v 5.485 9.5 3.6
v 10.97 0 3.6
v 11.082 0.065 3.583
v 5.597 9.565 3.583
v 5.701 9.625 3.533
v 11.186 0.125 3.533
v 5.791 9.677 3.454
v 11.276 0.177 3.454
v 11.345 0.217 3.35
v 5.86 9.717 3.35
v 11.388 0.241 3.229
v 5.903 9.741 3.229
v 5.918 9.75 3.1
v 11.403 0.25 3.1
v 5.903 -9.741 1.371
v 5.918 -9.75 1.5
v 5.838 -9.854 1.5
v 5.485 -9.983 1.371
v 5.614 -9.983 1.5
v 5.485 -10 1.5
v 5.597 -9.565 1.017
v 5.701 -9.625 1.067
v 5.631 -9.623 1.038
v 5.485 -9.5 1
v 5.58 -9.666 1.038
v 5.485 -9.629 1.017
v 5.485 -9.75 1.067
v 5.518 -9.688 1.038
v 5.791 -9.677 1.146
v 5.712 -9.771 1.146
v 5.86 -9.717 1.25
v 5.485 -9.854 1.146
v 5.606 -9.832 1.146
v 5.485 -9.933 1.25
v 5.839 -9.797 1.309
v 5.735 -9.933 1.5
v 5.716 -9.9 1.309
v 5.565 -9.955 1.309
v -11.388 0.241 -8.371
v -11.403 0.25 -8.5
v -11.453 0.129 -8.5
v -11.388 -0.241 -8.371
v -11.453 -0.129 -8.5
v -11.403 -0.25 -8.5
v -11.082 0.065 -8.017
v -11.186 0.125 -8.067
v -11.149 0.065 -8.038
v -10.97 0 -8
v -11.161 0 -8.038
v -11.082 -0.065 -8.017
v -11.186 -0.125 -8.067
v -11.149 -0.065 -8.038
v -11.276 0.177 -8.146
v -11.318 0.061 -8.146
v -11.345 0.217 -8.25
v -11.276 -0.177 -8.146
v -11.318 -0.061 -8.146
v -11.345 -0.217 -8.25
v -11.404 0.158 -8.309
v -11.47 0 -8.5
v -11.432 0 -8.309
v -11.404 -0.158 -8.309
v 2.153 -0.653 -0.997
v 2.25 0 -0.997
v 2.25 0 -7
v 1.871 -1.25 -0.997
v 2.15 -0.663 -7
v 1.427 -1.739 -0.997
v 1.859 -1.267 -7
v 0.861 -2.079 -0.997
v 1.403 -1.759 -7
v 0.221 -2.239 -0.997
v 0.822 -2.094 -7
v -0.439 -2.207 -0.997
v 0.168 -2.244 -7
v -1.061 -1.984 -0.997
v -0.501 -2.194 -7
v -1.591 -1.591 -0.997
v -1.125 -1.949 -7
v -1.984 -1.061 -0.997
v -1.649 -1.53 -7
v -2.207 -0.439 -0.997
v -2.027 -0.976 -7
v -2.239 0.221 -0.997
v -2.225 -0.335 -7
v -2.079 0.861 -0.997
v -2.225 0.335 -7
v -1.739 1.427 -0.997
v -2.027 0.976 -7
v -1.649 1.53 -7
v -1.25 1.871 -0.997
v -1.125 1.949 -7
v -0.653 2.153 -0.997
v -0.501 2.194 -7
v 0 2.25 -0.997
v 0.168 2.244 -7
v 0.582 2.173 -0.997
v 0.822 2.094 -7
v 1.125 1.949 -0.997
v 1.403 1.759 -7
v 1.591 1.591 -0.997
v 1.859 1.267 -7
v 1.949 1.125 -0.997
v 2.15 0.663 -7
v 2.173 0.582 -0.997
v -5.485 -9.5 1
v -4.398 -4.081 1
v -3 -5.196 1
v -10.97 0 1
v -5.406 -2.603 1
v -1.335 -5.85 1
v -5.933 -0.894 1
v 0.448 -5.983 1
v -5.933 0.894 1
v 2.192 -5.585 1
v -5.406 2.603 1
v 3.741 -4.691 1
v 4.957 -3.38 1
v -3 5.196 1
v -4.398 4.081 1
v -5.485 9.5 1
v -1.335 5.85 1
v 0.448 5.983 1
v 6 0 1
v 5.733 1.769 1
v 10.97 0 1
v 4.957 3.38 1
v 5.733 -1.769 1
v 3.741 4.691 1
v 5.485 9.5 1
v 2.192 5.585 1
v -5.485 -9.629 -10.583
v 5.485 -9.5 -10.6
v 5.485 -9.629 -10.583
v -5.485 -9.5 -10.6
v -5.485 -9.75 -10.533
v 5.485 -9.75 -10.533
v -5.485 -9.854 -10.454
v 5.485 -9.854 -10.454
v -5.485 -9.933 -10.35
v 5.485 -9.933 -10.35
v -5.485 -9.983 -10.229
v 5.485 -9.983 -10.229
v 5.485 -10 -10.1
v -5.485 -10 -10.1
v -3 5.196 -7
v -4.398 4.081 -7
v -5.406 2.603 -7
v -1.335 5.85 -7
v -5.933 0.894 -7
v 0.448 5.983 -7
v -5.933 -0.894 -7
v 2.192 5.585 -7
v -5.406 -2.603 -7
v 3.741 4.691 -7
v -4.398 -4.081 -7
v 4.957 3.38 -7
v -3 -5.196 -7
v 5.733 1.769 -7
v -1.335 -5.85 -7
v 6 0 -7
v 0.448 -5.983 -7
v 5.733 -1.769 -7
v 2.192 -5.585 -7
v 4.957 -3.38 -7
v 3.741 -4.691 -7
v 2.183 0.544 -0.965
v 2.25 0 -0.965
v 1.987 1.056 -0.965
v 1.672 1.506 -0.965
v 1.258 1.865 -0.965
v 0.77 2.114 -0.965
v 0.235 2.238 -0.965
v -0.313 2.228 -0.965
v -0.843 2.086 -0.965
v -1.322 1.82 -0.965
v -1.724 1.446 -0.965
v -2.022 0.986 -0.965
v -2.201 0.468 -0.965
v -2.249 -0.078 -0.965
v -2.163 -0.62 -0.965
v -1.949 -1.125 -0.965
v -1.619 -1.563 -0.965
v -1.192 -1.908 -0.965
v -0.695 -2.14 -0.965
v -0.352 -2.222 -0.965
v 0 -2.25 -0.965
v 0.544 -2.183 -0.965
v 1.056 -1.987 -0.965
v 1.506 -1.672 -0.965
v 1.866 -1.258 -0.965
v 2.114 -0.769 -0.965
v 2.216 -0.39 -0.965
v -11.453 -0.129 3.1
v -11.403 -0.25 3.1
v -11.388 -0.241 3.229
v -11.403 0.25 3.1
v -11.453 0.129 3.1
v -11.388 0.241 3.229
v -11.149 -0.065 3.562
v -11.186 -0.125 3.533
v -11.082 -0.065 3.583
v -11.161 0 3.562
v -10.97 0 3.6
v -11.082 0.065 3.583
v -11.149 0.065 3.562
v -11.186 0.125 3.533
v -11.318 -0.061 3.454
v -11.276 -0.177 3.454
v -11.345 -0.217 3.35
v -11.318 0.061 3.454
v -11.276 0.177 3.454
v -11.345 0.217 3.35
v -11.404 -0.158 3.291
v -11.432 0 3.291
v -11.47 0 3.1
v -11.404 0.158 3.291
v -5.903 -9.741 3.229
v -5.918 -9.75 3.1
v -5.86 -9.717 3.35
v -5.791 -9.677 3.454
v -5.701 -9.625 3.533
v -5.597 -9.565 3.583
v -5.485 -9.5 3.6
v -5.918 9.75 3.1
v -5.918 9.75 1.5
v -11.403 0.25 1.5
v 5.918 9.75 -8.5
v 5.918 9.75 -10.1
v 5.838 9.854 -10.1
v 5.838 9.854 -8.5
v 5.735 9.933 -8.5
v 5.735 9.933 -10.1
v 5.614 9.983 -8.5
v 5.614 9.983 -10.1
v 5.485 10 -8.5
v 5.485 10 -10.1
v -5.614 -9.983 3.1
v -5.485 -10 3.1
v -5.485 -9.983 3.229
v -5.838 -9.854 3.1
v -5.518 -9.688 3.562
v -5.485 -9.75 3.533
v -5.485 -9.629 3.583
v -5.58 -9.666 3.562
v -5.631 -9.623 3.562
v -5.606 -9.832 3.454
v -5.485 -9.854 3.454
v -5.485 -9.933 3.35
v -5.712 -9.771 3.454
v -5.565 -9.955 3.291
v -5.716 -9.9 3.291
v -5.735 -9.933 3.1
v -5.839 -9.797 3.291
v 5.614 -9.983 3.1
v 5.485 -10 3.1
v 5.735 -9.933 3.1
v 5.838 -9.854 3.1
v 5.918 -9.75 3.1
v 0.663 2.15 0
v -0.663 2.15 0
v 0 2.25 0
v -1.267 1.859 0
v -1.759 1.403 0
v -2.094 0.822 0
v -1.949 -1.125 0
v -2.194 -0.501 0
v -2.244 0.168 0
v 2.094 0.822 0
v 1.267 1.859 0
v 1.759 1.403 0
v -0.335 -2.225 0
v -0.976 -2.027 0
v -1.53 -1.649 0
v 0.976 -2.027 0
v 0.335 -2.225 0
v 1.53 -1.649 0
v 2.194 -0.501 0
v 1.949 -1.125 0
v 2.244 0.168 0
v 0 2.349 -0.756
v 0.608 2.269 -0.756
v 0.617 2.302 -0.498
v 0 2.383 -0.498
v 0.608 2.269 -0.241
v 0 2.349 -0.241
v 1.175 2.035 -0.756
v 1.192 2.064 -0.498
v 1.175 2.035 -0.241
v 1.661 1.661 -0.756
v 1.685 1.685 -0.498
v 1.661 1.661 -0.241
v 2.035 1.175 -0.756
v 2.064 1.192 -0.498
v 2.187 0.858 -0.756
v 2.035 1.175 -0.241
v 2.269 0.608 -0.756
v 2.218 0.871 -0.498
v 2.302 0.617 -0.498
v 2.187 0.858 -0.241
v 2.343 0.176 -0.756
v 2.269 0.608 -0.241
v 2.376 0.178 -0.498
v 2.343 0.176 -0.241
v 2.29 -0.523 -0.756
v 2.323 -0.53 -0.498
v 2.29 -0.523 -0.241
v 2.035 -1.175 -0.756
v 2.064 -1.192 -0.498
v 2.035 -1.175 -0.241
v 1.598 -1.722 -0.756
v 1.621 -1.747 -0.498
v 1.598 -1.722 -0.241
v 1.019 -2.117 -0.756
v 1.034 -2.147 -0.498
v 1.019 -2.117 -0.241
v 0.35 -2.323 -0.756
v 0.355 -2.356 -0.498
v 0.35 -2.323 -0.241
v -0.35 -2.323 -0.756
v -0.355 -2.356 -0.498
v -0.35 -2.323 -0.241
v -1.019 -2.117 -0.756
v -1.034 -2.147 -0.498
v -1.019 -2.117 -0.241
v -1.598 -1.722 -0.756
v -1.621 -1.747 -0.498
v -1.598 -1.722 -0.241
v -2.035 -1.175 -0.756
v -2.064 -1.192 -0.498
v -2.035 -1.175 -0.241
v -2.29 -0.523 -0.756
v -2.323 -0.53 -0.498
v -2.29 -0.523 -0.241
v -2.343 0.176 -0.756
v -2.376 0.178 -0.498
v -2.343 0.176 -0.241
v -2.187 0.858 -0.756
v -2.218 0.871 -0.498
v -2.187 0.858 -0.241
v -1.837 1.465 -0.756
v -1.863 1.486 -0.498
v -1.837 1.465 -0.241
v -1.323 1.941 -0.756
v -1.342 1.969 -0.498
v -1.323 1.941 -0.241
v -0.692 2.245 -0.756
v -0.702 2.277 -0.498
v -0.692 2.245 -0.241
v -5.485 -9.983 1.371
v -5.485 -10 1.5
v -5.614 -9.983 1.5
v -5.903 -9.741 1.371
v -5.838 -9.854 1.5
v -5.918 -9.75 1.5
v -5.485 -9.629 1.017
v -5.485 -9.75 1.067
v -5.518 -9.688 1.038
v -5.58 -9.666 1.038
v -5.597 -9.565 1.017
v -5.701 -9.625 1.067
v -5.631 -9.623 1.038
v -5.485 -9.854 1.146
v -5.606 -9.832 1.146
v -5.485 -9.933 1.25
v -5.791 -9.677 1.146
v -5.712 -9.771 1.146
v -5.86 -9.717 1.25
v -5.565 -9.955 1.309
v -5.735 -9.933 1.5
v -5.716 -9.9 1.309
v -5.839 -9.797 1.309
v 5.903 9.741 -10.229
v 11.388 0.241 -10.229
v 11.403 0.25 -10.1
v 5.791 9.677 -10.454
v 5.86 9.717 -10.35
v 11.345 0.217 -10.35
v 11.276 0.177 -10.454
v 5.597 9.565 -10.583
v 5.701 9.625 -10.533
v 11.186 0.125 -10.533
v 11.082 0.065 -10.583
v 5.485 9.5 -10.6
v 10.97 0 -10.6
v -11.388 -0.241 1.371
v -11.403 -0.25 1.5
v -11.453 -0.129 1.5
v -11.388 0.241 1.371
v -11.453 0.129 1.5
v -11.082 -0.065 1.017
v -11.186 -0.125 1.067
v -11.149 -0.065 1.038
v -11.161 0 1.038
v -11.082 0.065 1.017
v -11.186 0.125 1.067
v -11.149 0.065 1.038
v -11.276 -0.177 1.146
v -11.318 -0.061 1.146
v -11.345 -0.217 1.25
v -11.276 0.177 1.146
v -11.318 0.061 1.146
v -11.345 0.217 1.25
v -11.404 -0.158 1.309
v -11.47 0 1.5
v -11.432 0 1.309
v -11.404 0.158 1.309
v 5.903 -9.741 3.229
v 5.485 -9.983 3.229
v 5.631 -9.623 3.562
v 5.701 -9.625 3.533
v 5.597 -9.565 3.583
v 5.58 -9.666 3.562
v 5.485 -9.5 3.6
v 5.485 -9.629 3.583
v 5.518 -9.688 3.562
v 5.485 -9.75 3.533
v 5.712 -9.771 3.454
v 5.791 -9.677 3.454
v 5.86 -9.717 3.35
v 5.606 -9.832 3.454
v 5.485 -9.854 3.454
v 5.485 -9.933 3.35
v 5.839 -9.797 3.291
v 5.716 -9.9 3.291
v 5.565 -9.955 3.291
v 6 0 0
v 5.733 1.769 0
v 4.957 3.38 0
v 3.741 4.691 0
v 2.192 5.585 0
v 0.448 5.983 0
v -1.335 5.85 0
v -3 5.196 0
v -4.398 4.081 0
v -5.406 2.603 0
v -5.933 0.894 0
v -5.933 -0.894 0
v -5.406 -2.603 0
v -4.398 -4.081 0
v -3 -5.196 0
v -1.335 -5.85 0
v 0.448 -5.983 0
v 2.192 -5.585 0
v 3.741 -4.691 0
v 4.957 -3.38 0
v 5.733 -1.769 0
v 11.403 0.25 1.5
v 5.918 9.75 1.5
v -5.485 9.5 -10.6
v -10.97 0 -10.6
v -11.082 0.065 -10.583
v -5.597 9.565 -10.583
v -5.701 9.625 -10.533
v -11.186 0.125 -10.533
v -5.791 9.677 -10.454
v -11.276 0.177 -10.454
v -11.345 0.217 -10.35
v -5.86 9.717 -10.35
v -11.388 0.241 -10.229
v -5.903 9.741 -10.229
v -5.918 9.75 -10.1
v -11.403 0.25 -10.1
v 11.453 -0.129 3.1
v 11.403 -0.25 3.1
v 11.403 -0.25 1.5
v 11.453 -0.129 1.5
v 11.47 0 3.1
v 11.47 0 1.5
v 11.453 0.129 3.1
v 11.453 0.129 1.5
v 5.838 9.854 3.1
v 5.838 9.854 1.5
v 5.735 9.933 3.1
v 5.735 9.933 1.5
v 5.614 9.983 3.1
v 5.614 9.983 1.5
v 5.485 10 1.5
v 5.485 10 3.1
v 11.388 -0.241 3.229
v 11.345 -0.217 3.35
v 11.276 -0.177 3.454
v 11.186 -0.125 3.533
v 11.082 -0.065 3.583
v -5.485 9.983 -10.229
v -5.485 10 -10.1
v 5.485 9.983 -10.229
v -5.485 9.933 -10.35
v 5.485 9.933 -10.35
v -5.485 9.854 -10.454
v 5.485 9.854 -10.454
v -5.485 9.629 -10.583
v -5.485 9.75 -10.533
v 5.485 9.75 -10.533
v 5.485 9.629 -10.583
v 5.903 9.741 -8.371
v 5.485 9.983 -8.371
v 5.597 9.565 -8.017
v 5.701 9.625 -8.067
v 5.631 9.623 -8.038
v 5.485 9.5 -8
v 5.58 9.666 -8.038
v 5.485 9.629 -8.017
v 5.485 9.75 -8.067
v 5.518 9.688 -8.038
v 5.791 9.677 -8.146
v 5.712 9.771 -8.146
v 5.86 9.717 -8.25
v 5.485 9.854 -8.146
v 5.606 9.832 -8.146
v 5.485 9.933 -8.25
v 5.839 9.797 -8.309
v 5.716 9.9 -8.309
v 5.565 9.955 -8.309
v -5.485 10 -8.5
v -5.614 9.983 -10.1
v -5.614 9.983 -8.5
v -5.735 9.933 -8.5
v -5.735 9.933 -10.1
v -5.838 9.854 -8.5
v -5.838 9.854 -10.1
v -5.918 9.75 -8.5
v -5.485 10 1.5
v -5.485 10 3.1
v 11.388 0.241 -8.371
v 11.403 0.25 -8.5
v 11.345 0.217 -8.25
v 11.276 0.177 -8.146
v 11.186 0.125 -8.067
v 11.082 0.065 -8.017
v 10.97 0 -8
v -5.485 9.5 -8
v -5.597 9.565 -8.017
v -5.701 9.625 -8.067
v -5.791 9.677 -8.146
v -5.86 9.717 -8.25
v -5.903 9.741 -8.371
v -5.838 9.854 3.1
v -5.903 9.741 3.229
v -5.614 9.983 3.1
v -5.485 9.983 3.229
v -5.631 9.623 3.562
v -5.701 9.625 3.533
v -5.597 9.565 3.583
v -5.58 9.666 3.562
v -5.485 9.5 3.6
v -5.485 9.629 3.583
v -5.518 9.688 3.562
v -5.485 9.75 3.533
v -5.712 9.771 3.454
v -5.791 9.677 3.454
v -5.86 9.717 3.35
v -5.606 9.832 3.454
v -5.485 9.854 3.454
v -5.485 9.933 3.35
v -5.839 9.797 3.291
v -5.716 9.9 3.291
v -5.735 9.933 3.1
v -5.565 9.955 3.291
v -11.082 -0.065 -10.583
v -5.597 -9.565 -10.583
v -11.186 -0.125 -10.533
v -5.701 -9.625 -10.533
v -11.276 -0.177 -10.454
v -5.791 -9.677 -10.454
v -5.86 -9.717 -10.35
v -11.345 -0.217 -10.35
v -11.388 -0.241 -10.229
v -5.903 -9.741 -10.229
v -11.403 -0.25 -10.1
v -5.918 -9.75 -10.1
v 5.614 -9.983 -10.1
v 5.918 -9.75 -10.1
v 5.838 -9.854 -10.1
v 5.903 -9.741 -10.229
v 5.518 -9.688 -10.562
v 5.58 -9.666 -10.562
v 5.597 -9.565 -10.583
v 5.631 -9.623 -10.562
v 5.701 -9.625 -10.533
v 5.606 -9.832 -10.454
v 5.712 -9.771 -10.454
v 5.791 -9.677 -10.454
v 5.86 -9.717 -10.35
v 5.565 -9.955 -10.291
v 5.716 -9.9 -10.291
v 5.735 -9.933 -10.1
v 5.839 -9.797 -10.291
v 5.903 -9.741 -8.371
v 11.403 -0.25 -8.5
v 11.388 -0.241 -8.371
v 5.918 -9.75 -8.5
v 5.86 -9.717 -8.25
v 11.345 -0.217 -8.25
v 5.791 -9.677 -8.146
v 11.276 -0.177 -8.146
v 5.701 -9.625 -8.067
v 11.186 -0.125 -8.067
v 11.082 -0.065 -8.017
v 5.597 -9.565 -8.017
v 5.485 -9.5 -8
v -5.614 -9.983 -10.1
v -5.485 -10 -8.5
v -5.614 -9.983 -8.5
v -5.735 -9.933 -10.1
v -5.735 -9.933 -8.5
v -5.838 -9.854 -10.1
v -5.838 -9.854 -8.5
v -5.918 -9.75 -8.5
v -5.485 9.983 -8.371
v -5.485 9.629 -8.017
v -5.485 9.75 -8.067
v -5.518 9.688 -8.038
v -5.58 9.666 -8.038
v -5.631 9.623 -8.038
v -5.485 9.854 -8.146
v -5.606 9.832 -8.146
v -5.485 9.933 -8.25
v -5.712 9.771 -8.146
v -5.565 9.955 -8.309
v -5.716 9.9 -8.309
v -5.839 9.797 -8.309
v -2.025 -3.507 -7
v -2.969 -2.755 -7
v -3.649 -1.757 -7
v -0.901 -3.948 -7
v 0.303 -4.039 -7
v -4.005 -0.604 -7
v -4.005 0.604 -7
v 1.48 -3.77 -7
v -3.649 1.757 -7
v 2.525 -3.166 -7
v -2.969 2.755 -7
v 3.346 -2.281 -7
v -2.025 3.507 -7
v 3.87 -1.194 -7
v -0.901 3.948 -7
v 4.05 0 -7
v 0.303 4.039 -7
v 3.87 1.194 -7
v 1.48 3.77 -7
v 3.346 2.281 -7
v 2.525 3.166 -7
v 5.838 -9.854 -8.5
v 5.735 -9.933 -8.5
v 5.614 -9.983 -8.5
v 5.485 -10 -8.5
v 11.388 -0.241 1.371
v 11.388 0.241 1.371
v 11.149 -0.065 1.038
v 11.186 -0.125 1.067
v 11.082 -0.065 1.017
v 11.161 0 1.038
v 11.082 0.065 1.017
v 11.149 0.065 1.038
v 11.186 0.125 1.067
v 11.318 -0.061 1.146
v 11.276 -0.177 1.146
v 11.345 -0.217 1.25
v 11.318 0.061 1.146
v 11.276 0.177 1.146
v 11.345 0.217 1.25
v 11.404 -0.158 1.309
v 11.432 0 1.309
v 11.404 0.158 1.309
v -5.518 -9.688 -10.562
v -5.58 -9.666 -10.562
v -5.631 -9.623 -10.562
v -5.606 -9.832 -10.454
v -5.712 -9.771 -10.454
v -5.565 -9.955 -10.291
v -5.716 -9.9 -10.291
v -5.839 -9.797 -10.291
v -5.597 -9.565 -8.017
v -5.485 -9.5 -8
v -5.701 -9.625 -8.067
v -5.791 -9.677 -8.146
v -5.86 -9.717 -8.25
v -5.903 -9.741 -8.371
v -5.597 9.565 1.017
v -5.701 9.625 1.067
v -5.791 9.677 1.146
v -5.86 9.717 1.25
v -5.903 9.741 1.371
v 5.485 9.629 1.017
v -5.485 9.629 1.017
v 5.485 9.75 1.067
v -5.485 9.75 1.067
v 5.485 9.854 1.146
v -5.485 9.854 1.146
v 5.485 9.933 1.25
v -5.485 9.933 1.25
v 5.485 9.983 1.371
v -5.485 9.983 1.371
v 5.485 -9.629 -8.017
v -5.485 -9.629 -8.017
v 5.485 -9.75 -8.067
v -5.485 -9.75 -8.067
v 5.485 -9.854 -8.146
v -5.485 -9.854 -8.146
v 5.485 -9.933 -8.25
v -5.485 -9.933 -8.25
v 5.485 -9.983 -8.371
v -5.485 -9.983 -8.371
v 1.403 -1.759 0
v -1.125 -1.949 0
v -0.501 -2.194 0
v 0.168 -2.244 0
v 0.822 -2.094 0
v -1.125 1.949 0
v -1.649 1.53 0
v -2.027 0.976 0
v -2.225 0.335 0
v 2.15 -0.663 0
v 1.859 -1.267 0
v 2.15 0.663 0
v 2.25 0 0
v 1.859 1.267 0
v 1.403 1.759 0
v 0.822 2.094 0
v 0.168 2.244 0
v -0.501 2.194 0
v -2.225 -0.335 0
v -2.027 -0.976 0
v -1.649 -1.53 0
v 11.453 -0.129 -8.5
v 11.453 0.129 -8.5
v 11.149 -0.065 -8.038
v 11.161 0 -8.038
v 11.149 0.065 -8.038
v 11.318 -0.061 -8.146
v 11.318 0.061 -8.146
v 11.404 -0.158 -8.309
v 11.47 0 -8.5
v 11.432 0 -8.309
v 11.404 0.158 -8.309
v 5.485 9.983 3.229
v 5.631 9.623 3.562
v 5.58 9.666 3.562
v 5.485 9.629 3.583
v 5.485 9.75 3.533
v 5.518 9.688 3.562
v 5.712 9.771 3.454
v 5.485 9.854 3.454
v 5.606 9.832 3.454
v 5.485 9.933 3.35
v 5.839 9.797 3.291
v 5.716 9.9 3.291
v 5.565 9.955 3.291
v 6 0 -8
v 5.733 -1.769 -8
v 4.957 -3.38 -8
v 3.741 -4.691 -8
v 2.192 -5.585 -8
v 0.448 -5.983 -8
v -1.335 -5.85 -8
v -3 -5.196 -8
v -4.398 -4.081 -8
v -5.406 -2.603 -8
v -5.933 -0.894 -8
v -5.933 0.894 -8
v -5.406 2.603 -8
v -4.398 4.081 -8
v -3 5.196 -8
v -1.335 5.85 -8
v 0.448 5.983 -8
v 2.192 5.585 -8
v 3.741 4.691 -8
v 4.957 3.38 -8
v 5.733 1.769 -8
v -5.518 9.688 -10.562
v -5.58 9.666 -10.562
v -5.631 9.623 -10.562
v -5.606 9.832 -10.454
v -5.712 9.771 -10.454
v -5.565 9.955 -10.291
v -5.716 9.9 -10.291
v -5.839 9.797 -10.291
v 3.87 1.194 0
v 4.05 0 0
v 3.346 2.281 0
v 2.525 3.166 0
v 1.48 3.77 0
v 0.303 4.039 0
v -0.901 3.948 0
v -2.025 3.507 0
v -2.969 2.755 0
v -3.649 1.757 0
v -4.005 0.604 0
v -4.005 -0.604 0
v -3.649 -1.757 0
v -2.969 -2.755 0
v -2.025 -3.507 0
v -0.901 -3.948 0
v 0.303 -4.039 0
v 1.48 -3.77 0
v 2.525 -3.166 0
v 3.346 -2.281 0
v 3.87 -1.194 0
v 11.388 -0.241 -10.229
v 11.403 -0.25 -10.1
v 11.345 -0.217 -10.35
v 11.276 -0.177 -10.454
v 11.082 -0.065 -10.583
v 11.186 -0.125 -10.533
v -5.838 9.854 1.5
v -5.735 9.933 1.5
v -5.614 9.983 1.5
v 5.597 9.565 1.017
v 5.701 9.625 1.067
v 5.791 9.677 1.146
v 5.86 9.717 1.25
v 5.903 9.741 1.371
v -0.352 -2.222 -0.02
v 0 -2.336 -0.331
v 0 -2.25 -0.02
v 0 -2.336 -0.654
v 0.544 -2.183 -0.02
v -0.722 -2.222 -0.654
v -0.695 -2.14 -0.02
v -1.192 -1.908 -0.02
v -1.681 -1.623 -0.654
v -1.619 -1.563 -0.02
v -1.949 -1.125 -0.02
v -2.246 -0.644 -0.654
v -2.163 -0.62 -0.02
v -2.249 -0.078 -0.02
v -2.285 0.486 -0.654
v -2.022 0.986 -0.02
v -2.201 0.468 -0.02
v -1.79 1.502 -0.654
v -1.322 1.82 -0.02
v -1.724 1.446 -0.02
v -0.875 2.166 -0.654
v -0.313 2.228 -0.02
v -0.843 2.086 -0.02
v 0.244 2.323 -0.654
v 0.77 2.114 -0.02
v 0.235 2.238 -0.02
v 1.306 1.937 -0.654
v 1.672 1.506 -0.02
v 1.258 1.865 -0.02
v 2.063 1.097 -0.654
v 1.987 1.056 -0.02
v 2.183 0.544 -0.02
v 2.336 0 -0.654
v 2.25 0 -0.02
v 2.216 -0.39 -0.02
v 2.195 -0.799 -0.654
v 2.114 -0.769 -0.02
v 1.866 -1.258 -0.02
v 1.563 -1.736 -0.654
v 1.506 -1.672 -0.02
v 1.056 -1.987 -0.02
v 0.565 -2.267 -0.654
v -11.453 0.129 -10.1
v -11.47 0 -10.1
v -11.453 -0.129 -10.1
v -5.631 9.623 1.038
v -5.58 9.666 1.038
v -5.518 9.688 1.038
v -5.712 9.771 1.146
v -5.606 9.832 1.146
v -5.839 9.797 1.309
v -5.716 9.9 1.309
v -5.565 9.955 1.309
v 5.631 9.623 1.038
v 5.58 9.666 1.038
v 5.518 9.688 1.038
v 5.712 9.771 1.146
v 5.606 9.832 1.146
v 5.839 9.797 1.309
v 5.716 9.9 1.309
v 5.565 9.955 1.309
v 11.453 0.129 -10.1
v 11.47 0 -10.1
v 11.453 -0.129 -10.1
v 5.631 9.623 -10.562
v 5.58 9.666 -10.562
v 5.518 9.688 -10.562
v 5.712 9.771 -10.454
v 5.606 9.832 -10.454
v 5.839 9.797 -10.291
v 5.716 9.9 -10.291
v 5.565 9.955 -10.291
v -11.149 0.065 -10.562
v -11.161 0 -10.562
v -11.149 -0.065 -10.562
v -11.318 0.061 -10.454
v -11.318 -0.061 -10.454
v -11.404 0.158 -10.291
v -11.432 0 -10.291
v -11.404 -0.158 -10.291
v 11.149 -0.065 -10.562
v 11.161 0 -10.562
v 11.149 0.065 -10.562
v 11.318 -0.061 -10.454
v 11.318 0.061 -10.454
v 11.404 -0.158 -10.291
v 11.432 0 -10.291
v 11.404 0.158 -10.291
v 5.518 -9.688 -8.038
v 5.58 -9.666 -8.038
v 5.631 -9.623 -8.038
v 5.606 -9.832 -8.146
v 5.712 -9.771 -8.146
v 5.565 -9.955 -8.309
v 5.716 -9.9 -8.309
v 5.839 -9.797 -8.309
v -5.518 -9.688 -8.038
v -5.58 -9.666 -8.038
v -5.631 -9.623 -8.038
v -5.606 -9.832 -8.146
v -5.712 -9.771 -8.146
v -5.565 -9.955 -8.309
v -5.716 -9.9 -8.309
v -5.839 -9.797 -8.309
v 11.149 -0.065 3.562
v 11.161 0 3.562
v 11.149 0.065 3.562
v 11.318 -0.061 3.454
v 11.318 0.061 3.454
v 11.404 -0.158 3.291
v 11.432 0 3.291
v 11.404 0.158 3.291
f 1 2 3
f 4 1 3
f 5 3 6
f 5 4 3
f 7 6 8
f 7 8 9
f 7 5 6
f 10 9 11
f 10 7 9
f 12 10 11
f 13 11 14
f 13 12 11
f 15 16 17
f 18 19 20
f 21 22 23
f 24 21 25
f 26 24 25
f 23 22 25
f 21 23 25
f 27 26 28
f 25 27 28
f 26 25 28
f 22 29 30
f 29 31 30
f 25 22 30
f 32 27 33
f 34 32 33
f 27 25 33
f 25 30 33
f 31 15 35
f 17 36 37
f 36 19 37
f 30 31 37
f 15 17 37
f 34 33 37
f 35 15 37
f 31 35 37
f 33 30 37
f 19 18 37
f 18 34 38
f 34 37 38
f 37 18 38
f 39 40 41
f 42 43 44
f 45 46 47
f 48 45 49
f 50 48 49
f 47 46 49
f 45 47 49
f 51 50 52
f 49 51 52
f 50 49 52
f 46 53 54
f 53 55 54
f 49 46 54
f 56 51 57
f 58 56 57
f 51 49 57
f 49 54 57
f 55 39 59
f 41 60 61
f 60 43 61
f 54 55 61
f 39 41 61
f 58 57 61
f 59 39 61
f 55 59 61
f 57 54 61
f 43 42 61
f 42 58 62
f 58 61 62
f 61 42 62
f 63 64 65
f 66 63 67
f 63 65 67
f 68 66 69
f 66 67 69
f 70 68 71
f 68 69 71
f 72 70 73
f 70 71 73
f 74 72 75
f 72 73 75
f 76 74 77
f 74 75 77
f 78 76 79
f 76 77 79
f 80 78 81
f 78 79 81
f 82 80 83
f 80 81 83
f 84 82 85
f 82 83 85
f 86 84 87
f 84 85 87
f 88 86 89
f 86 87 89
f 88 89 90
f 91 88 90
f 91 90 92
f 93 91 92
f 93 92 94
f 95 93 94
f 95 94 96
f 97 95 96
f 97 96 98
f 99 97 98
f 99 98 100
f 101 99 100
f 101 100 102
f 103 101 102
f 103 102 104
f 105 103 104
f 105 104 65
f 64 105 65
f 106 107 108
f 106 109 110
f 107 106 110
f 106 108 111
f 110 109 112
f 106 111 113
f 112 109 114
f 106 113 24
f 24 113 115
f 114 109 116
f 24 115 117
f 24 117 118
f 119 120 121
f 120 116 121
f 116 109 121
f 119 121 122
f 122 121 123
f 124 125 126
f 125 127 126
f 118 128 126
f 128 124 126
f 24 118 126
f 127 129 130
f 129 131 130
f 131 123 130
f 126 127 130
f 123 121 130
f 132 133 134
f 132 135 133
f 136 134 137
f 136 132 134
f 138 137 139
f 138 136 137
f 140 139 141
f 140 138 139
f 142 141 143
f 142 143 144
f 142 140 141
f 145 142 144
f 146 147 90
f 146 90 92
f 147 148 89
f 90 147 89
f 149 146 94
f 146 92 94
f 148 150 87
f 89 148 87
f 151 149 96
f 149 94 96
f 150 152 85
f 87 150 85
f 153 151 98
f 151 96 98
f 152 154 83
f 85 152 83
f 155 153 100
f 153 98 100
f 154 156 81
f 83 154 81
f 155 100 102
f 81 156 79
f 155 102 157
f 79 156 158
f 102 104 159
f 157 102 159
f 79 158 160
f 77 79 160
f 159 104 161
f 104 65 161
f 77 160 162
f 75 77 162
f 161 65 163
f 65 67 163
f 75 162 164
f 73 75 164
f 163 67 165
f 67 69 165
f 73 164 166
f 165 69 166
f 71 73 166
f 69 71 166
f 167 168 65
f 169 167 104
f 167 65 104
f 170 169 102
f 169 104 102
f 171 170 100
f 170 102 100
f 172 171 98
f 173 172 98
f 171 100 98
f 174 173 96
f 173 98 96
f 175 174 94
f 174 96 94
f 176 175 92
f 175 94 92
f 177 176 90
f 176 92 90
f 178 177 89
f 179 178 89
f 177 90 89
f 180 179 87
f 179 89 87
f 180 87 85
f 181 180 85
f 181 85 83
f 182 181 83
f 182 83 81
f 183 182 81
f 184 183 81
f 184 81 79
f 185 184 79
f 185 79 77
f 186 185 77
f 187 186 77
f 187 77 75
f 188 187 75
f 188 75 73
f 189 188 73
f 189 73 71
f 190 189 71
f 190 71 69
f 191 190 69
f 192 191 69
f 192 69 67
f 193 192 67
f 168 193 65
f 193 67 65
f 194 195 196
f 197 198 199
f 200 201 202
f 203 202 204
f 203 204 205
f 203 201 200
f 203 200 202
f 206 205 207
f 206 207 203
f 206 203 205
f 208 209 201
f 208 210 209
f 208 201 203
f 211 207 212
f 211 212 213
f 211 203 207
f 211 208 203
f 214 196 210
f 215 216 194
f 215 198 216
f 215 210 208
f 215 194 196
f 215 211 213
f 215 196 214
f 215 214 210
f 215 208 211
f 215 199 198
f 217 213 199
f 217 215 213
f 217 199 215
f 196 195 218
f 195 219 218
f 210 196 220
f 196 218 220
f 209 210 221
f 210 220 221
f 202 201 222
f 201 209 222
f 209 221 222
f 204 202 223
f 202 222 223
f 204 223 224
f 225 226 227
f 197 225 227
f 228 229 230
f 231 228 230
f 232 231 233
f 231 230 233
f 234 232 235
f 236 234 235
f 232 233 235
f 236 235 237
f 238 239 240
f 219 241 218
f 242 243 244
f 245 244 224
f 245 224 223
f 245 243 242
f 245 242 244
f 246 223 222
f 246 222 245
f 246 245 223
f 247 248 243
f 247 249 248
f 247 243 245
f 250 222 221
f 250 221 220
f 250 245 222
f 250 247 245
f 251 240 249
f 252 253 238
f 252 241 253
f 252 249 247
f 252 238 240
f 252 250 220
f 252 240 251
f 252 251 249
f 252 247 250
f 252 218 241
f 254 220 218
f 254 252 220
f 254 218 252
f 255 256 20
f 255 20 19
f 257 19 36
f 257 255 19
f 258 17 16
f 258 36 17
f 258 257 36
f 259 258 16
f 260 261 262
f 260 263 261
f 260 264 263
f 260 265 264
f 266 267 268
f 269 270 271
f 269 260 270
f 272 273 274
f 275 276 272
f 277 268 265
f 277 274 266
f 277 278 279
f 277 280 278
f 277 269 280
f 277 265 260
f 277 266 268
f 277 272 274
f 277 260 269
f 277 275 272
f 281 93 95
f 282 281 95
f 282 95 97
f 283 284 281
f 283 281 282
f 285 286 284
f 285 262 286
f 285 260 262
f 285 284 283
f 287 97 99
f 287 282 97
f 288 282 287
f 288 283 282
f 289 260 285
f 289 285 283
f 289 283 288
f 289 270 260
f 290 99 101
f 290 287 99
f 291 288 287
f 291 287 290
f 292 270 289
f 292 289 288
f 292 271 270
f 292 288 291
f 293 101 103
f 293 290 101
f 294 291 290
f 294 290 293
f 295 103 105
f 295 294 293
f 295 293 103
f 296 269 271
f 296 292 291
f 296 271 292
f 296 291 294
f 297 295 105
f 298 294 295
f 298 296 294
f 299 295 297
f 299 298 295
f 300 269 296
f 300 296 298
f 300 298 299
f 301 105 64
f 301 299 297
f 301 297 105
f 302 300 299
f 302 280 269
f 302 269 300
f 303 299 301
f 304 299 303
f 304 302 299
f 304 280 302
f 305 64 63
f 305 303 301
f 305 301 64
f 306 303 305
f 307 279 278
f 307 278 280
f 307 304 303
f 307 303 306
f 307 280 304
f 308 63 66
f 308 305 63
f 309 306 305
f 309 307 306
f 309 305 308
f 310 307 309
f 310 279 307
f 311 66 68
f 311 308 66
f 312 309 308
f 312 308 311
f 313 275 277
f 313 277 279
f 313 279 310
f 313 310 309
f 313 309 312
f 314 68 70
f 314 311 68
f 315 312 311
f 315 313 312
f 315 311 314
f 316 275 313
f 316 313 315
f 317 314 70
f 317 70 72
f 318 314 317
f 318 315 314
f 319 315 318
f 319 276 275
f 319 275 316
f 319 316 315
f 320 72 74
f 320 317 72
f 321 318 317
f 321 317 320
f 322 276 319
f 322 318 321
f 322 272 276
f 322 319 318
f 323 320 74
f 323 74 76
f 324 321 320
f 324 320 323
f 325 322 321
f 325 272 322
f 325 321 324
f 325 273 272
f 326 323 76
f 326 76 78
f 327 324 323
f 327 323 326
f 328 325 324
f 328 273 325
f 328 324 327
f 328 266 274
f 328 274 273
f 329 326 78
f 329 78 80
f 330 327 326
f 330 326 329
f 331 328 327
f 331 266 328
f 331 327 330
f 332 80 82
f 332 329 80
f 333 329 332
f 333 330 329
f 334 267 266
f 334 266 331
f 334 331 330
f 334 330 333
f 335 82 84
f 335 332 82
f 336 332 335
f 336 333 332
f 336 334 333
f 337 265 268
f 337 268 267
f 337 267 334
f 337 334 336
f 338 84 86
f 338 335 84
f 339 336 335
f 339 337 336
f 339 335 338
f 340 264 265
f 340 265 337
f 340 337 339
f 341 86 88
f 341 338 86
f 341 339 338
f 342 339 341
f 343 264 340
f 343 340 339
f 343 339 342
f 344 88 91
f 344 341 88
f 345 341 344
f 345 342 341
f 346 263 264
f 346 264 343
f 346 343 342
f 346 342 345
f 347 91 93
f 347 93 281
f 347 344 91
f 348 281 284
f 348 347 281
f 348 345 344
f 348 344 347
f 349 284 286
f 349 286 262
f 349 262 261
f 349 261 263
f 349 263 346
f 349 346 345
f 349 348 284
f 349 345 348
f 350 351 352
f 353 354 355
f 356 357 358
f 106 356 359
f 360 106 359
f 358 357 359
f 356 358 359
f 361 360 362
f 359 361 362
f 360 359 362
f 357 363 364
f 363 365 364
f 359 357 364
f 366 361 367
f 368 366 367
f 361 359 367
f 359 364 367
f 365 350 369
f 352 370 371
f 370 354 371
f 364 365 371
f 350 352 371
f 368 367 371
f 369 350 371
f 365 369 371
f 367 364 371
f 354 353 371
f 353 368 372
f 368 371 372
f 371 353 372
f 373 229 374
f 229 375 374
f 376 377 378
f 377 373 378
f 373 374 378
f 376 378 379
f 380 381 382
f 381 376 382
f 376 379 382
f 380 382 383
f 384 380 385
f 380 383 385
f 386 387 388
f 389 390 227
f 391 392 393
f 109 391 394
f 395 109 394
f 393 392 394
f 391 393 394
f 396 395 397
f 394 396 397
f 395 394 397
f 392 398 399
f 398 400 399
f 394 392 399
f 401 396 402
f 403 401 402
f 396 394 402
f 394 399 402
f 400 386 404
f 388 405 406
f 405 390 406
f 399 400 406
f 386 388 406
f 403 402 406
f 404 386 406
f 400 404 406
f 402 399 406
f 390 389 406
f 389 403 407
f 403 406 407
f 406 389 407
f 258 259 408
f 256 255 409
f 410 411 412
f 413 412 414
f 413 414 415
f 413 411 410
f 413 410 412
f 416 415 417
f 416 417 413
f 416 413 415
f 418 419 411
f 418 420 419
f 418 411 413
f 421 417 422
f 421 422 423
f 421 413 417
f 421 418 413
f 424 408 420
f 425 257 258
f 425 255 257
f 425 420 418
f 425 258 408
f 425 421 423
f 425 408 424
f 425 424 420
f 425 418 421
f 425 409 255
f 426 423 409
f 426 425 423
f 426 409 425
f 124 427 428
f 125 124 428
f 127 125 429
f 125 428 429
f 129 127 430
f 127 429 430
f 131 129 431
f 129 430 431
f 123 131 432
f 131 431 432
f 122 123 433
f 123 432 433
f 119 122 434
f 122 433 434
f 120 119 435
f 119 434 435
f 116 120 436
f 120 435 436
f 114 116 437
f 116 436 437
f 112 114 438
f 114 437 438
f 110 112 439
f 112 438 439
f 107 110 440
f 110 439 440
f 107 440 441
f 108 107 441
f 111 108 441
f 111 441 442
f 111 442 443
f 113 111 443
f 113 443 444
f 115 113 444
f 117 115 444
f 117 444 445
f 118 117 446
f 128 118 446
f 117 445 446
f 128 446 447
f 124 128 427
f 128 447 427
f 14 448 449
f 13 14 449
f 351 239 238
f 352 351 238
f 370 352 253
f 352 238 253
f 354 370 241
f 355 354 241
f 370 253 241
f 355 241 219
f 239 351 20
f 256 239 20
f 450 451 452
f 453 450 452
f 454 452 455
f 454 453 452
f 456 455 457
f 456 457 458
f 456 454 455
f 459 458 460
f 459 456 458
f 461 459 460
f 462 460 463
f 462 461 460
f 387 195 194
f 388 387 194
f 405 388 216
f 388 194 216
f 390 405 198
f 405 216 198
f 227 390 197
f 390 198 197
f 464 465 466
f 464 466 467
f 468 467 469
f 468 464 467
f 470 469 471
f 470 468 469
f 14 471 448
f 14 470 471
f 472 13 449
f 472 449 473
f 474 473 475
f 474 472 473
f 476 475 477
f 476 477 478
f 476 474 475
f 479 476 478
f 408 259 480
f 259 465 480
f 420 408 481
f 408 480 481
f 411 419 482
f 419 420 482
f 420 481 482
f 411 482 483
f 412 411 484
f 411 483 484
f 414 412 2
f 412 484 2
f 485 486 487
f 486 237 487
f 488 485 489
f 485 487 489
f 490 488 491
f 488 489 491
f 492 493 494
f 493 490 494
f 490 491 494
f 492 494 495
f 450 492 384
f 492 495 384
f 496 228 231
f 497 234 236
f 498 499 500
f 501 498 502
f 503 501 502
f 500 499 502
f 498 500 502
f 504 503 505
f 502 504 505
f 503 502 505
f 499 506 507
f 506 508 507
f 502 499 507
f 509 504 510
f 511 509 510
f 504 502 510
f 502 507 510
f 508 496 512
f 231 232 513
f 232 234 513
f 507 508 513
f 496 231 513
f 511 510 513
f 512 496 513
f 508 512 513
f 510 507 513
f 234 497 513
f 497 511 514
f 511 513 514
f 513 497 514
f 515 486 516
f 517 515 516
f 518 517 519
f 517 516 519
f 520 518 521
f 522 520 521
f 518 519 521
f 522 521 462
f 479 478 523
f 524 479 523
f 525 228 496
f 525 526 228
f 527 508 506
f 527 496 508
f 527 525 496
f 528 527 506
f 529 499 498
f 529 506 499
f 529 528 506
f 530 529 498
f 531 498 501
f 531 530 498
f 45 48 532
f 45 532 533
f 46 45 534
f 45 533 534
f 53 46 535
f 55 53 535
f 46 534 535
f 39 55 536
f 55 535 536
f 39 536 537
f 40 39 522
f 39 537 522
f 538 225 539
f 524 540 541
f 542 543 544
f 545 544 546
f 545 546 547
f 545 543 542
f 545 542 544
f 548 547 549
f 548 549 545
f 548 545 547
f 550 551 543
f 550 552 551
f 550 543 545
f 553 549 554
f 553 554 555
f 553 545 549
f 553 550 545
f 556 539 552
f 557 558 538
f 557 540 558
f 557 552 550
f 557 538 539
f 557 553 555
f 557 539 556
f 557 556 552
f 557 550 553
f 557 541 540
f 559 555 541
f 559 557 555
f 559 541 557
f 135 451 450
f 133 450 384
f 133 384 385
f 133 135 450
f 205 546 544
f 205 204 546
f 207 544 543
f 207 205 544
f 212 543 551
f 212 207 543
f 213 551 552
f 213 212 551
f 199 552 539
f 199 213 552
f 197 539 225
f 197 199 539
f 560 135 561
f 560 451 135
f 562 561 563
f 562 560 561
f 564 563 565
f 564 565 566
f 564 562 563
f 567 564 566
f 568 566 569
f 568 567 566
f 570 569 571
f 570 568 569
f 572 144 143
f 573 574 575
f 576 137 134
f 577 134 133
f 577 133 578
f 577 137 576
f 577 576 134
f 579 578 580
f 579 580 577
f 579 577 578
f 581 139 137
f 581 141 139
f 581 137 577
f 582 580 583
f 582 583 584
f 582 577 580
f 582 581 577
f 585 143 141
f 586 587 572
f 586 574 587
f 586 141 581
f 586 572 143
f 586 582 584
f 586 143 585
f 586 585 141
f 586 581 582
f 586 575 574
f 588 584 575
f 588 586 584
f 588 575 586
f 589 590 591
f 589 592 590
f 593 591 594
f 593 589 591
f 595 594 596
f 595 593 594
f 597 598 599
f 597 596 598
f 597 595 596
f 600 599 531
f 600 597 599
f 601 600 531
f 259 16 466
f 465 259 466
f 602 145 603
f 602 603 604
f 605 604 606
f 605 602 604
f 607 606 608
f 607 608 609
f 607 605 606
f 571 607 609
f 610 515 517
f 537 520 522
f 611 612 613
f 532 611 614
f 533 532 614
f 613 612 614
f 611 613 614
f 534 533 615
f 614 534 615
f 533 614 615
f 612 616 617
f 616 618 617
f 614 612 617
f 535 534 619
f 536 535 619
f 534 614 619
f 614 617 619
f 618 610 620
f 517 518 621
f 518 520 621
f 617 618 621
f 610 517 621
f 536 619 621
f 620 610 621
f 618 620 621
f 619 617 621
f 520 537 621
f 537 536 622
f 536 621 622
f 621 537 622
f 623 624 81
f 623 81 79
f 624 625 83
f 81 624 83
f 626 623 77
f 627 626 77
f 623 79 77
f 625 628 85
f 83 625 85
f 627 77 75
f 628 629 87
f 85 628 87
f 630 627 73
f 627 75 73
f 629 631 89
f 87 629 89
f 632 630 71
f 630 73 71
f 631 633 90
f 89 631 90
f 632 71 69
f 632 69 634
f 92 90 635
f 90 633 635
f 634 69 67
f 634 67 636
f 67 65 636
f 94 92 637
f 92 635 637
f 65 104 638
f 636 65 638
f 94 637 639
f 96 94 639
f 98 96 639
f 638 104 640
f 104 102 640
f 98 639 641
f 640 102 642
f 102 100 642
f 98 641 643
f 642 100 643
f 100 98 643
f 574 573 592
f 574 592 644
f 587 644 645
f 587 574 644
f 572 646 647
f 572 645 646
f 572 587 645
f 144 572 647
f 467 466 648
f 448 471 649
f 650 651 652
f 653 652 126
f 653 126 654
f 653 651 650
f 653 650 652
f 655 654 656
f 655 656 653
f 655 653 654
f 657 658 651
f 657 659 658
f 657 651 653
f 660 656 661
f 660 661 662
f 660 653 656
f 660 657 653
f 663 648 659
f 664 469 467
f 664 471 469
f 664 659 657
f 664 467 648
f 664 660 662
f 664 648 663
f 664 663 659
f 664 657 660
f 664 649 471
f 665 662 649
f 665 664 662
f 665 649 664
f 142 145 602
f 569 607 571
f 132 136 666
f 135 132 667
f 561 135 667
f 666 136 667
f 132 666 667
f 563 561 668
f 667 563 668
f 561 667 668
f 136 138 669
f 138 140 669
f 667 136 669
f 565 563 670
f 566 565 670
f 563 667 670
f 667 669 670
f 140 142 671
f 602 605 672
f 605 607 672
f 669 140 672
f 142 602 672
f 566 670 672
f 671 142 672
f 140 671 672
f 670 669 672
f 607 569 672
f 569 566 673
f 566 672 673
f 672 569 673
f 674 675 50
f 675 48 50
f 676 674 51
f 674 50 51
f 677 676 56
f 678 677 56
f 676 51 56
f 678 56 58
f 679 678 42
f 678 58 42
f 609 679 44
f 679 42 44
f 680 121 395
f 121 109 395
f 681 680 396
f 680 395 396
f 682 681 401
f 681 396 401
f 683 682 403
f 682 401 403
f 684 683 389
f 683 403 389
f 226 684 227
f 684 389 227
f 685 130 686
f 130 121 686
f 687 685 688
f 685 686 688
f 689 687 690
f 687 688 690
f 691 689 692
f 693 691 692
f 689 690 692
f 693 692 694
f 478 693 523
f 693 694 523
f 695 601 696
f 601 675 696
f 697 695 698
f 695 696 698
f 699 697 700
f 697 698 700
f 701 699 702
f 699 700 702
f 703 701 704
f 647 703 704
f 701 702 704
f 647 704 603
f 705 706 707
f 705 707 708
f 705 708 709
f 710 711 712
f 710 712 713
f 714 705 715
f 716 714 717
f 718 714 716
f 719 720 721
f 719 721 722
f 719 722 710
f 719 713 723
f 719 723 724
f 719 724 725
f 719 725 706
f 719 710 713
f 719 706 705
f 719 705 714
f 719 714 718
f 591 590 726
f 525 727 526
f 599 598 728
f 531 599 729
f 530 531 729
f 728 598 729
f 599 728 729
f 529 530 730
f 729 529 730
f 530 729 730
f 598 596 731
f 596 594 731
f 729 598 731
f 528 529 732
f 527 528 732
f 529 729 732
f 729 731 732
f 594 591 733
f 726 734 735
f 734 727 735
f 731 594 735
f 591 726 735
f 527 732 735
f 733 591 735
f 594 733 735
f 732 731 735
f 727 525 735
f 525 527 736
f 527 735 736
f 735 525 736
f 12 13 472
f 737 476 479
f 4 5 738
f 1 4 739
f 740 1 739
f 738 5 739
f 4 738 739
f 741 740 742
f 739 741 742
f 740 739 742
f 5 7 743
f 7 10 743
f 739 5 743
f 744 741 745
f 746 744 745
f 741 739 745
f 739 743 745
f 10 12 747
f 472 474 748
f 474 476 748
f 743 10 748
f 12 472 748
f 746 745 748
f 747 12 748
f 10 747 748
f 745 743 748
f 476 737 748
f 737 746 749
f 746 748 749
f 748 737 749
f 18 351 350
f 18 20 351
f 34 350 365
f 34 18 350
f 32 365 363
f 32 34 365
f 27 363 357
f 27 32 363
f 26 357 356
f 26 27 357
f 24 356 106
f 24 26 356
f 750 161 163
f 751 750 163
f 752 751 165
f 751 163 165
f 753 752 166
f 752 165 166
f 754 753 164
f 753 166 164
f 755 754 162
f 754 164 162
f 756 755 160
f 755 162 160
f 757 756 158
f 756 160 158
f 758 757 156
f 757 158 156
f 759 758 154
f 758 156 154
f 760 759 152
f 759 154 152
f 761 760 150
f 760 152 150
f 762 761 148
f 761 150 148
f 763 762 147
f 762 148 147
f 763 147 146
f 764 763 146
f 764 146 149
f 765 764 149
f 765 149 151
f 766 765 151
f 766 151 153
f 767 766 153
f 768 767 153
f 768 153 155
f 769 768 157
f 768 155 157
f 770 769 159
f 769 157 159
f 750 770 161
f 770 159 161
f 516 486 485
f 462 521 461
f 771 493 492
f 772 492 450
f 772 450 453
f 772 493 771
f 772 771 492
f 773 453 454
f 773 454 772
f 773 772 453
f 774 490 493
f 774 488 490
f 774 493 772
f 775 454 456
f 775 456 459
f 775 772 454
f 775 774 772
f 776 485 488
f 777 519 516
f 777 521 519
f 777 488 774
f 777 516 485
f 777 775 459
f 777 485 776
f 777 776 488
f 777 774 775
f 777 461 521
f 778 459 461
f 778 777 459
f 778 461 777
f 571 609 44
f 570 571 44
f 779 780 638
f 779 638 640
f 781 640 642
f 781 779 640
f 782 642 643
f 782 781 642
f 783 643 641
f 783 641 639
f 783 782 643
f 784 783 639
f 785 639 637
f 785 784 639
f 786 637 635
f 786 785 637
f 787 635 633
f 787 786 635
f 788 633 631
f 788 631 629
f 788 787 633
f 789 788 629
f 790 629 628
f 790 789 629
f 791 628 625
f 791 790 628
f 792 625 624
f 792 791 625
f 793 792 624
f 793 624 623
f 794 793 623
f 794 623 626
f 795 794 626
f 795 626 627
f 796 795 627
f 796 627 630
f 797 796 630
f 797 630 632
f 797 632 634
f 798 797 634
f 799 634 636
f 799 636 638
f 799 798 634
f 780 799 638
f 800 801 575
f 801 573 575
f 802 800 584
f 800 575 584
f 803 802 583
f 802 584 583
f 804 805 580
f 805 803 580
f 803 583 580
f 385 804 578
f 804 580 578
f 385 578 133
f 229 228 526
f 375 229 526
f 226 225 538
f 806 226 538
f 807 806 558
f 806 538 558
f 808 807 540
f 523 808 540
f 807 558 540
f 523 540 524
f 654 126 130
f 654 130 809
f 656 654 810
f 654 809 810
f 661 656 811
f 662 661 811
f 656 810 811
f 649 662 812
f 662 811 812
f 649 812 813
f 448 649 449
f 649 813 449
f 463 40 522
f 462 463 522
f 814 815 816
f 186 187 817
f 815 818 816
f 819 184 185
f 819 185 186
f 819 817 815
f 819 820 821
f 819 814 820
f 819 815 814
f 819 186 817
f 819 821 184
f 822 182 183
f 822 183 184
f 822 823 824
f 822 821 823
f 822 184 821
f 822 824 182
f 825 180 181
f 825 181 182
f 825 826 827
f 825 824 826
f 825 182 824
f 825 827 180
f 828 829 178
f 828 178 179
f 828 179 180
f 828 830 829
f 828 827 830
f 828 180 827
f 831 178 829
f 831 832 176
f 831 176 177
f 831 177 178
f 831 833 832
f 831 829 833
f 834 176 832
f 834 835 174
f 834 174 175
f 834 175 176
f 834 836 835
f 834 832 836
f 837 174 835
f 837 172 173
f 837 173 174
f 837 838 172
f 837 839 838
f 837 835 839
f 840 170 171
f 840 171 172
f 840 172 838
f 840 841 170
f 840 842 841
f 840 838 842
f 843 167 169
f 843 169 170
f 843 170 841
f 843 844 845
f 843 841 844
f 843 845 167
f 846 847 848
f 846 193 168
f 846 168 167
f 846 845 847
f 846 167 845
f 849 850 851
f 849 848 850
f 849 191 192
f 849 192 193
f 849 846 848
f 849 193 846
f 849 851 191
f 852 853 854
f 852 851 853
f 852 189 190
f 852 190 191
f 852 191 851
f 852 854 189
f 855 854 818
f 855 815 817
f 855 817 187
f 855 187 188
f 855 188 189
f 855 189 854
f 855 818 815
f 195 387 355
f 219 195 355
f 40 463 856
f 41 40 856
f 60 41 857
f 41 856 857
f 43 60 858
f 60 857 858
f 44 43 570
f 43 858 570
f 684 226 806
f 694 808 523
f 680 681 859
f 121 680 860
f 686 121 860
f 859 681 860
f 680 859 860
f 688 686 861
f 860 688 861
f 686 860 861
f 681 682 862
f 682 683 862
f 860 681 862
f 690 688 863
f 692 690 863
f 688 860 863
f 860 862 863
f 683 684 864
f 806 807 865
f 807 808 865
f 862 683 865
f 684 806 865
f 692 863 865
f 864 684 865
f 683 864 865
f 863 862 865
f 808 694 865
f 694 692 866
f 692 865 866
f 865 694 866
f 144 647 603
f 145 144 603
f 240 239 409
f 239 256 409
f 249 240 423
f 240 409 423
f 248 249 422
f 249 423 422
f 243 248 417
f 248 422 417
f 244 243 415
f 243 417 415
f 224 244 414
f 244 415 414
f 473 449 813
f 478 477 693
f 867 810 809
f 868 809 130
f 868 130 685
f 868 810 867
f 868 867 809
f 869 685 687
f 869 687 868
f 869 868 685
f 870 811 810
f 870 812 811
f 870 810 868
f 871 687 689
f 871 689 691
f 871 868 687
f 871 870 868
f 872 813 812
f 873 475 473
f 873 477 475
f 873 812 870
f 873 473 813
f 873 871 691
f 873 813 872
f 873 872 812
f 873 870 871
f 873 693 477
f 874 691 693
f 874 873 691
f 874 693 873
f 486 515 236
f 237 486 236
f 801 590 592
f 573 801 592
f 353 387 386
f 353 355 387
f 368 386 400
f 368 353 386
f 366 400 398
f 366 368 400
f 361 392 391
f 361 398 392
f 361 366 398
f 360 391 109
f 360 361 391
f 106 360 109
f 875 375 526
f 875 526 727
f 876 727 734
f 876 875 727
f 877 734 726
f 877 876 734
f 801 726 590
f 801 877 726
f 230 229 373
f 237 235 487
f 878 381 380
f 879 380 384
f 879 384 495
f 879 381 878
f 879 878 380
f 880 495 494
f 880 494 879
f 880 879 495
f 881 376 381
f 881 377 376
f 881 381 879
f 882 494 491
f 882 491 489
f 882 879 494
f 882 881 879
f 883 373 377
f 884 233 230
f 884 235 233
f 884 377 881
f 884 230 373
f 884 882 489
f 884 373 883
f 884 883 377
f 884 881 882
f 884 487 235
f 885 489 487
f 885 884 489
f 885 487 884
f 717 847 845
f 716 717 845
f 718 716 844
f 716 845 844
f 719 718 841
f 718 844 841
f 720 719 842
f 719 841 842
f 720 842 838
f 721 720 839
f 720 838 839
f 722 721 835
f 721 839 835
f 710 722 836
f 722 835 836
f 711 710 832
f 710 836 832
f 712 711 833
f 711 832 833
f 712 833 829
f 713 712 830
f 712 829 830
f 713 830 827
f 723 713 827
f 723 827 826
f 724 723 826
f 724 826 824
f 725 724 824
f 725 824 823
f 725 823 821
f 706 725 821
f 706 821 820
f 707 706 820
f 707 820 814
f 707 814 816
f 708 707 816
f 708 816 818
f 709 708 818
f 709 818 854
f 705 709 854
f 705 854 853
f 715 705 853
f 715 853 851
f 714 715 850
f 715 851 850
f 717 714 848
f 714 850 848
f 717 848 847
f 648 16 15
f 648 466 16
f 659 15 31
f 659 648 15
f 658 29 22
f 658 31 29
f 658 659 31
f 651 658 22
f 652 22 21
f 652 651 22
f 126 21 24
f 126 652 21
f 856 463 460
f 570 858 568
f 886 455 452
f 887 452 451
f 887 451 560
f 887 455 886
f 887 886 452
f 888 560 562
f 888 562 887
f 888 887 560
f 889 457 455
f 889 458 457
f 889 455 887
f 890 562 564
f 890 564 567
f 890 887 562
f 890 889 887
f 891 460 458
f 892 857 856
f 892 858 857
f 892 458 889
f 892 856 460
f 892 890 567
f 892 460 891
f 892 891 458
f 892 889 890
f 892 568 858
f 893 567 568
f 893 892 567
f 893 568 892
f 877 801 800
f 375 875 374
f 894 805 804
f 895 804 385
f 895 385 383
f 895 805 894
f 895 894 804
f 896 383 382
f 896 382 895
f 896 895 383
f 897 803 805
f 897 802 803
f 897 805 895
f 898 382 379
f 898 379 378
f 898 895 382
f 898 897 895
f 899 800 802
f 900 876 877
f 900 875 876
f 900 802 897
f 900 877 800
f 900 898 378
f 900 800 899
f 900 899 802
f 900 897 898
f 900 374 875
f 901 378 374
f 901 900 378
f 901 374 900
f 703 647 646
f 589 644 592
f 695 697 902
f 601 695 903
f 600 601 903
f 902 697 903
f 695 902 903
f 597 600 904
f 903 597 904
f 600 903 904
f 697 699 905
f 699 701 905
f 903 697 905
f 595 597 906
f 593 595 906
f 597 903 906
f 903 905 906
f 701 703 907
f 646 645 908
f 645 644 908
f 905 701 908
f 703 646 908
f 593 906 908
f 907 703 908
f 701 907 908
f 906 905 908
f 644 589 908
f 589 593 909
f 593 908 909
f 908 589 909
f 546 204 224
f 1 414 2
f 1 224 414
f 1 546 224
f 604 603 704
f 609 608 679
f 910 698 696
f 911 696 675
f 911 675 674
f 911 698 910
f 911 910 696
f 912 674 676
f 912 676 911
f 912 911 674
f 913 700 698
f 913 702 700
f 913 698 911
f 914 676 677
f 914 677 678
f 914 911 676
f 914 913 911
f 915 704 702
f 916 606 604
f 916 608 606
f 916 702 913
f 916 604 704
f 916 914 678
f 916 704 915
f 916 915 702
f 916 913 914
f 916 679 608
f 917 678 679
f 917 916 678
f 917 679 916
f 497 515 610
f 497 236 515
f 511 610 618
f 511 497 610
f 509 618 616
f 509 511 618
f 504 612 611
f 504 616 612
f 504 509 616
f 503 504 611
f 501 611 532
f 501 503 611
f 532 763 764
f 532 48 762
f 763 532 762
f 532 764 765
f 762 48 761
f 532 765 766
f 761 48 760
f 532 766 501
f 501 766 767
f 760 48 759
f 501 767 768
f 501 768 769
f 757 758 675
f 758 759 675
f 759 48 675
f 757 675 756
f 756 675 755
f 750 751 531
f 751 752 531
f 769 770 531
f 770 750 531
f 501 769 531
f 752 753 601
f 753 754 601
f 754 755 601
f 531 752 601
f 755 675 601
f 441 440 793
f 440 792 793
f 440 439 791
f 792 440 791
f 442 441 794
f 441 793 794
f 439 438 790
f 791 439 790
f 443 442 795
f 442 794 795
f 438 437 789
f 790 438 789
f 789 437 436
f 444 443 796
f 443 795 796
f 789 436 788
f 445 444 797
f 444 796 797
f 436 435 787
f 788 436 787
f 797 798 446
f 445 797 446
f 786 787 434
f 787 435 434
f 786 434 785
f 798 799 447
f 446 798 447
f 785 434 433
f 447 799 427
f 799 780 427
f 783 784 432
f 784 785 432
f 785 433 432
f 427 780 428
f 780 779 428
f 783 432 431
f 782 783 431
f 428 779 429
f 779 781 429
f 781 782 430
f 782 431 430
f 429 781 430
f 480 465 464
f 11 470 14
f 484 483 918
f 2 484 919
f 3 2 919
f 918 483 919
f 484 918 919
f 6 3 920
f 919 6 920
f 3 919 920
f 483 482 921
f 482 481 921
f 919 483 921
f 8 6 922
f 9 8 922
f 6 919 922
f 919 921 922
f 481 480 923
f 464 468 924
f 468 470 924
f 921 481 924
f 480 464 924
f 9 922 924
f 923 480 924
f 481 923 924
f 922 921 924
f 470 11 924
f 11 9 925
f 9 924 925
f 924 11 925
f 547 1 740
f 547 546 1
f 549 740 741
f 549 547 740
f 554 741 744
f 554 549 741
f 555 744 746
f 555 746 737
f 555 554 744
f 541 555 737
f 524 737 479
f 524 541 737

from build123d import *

# Parameters (mm, degrees)
F0_R      = 6
F0_R_2    = 4.05
F1_DEPTH  = 1
F2_DEPTH  = 7
F4_DEPTH  = 2.6
F5_R      = 6
F5_R_2    = 4.05
F6_DEPTH  = 1
F8_DEPTH  = 2.6
F9_R      = 0.5
F9_2_R    = 0.5
F10_R     = 2.25
F11_DEPTH = 7
F14_R     = 2.25
F15_DEPTH = 7


with BuildPart() as f1:
    # F0 (on Top) → F1 (new body)
    with BuildSketch(Plane.XY):
        Circle(F0_R)
        Circle(F0_R_2, mode=Mode.SUBTRACT)
        Circle(F0_R_2)
    extrude(amount=F1_DEPTH)

    # F0 (on Top) → F2 (join)
    with BuildSketch(Plane.XY):
        Circle(F0_R_2)
    extrude(amount=-F2_DEPTH)

    # F3 (on face) → F4 (join)
    with BuildSketch(Plane.XY.offset(1)):
        Polygon((-5.7735026919, -10), (5.7735026919, -10), (11.5470053838, 0), (5.7735026919, 10), (-5.7735026919, 10), (-11.5470053838, 0), align=None)
    extrude(amount=F4_DEPTH)

    # F9
    f9_edges = [f1.edges().sort_by_distance(p)[0] for p in [
        (5.773503, -10, 2.3),
        (11.547005, 0, 2.3),
        (8.660254, -5, 1),
        (8.660254, -5, 3.6),
        (5.773503, 10, 2.3),
        (8.660254, 5, 1),
        (8.660254, 5, 3.6),
        (-5.773503, -10, 2.3),
        (0, -10, 1),
        (0, -10, 3.6),
        (-11.547005, 0, 2.3),
        (-8.660254, -5, 1),
        (-8.660254, -5, 3.6),
        (-5.773503, 10, 2.3),
        (-8.660254, 5, 1),
        (-8.660254, 5, 3.6),
        (0, 10, 1),
        (0, 10, 3.6),
    ]]
    fillet(f9_edges, radius=F9_R)

    # F10 (on face) → F11 (cut)
    with BuildSketch(Plane(origin=(0, 0, -7), x_dir=(1, 0, 0), z_dir=(0, 0, -1))):
        Circle(F10_R)
    extrude(amount=-F11_DEPTH, mode=Mode.SUBTRACT)

    # F12 (on Right) → F13 (revolve, cut)
    with BuildSketch(Plane.YZ):
        with BuildLine():
            Line((2.25, 0), (2.25, -0.996934039))
            ThreePointArc((2.25, -0.996934039), (2.3830913367, -0.4984670195), (2.25, 0))
        make_face()
    revolve(axis=Axis((0, 0, -3.8720492739), (0, 0, -1)), mode=Mode.SUBTRACT)


with BuildPart() as f6:
    # F5 (on face) → F6 (new body)
    with BuildSketch(Plane(origin=(0, 0, -7), x_dir=(1, 0, 0), z_dir=(0, 0, -1))):
        Circle(F5_R)
        Circle(F5_R_2, mode=Mode.SUBTRACT)
        Circle(F5_R_2)
    extrude(amount=F6_DEPTH)

    # F7 (on face) → F8 (join)
    with BuildSketch(Plane(origin=(0, 0, -8), x_dir=(1, 0, 0), z_dir=(0, 0, -1))):
        Polygon((5.7735026919, -10), (11.5470053838, 0), (5.7735026919, 10), (-5.7735026919, 10), (-11.5470053838, 0), (-5.7735026919, -10), align=None)
    extrude(amount=F8_DEPTH)

    # F9#2
    f9_2_edges = [f6.edges().sort_by_distance(p)[0] for p in [
        (5.773503, -10, -9.3),
        (-5.773503, -10, -9.3),
        (0, -10, -8),
        (0, -10, -10.6),
        (11.547005, 0, -9.3),
        (8.660254, -5, -8),
        (8.660254, -5, -10.6),
        (5.773503, 10, -9.3),
        (8.660254, 5, -8),
        (8.660254, 5, -10.6),
        (-5.773503, 10, -9.3),
        (0, 10, -8),
        (0, 10, -10.6),
        (-11.547005, 0, -9.3),
        (-8.660254, 5, -8),
        (-8.660254, 5, -10.6),
        (-8.660254, -5, -8),
        (-8.660254, -5, -10.6),
    ]]
    fillet(f9_2_edges, radius=F9_2_R)

    # F14 (on face) → F15 (join, through all)
    with BuildSketch(Plane.XY.offset(-7)):
        Circle(F14_R)
    extrude(amount=F15_DEPTH)

    # F16 (on Right) → F17 (revolve)
    with BuildSketch(Plane.YZ):
        with BuildLine():
            Line((-2.2414149716, -0.9849705966), (-2.2414149716, 0))
            ThreePointArc((-2.2414149716, 0), (-2.3471306252, -0.4924852983), (-2.2414149716, -0.9849705966))
        make_face()
    revolve(axis=Axis((0, 0, -3.7047876976), (0, 0, -1)))


solid = Compound([f1.part, f6.part])
